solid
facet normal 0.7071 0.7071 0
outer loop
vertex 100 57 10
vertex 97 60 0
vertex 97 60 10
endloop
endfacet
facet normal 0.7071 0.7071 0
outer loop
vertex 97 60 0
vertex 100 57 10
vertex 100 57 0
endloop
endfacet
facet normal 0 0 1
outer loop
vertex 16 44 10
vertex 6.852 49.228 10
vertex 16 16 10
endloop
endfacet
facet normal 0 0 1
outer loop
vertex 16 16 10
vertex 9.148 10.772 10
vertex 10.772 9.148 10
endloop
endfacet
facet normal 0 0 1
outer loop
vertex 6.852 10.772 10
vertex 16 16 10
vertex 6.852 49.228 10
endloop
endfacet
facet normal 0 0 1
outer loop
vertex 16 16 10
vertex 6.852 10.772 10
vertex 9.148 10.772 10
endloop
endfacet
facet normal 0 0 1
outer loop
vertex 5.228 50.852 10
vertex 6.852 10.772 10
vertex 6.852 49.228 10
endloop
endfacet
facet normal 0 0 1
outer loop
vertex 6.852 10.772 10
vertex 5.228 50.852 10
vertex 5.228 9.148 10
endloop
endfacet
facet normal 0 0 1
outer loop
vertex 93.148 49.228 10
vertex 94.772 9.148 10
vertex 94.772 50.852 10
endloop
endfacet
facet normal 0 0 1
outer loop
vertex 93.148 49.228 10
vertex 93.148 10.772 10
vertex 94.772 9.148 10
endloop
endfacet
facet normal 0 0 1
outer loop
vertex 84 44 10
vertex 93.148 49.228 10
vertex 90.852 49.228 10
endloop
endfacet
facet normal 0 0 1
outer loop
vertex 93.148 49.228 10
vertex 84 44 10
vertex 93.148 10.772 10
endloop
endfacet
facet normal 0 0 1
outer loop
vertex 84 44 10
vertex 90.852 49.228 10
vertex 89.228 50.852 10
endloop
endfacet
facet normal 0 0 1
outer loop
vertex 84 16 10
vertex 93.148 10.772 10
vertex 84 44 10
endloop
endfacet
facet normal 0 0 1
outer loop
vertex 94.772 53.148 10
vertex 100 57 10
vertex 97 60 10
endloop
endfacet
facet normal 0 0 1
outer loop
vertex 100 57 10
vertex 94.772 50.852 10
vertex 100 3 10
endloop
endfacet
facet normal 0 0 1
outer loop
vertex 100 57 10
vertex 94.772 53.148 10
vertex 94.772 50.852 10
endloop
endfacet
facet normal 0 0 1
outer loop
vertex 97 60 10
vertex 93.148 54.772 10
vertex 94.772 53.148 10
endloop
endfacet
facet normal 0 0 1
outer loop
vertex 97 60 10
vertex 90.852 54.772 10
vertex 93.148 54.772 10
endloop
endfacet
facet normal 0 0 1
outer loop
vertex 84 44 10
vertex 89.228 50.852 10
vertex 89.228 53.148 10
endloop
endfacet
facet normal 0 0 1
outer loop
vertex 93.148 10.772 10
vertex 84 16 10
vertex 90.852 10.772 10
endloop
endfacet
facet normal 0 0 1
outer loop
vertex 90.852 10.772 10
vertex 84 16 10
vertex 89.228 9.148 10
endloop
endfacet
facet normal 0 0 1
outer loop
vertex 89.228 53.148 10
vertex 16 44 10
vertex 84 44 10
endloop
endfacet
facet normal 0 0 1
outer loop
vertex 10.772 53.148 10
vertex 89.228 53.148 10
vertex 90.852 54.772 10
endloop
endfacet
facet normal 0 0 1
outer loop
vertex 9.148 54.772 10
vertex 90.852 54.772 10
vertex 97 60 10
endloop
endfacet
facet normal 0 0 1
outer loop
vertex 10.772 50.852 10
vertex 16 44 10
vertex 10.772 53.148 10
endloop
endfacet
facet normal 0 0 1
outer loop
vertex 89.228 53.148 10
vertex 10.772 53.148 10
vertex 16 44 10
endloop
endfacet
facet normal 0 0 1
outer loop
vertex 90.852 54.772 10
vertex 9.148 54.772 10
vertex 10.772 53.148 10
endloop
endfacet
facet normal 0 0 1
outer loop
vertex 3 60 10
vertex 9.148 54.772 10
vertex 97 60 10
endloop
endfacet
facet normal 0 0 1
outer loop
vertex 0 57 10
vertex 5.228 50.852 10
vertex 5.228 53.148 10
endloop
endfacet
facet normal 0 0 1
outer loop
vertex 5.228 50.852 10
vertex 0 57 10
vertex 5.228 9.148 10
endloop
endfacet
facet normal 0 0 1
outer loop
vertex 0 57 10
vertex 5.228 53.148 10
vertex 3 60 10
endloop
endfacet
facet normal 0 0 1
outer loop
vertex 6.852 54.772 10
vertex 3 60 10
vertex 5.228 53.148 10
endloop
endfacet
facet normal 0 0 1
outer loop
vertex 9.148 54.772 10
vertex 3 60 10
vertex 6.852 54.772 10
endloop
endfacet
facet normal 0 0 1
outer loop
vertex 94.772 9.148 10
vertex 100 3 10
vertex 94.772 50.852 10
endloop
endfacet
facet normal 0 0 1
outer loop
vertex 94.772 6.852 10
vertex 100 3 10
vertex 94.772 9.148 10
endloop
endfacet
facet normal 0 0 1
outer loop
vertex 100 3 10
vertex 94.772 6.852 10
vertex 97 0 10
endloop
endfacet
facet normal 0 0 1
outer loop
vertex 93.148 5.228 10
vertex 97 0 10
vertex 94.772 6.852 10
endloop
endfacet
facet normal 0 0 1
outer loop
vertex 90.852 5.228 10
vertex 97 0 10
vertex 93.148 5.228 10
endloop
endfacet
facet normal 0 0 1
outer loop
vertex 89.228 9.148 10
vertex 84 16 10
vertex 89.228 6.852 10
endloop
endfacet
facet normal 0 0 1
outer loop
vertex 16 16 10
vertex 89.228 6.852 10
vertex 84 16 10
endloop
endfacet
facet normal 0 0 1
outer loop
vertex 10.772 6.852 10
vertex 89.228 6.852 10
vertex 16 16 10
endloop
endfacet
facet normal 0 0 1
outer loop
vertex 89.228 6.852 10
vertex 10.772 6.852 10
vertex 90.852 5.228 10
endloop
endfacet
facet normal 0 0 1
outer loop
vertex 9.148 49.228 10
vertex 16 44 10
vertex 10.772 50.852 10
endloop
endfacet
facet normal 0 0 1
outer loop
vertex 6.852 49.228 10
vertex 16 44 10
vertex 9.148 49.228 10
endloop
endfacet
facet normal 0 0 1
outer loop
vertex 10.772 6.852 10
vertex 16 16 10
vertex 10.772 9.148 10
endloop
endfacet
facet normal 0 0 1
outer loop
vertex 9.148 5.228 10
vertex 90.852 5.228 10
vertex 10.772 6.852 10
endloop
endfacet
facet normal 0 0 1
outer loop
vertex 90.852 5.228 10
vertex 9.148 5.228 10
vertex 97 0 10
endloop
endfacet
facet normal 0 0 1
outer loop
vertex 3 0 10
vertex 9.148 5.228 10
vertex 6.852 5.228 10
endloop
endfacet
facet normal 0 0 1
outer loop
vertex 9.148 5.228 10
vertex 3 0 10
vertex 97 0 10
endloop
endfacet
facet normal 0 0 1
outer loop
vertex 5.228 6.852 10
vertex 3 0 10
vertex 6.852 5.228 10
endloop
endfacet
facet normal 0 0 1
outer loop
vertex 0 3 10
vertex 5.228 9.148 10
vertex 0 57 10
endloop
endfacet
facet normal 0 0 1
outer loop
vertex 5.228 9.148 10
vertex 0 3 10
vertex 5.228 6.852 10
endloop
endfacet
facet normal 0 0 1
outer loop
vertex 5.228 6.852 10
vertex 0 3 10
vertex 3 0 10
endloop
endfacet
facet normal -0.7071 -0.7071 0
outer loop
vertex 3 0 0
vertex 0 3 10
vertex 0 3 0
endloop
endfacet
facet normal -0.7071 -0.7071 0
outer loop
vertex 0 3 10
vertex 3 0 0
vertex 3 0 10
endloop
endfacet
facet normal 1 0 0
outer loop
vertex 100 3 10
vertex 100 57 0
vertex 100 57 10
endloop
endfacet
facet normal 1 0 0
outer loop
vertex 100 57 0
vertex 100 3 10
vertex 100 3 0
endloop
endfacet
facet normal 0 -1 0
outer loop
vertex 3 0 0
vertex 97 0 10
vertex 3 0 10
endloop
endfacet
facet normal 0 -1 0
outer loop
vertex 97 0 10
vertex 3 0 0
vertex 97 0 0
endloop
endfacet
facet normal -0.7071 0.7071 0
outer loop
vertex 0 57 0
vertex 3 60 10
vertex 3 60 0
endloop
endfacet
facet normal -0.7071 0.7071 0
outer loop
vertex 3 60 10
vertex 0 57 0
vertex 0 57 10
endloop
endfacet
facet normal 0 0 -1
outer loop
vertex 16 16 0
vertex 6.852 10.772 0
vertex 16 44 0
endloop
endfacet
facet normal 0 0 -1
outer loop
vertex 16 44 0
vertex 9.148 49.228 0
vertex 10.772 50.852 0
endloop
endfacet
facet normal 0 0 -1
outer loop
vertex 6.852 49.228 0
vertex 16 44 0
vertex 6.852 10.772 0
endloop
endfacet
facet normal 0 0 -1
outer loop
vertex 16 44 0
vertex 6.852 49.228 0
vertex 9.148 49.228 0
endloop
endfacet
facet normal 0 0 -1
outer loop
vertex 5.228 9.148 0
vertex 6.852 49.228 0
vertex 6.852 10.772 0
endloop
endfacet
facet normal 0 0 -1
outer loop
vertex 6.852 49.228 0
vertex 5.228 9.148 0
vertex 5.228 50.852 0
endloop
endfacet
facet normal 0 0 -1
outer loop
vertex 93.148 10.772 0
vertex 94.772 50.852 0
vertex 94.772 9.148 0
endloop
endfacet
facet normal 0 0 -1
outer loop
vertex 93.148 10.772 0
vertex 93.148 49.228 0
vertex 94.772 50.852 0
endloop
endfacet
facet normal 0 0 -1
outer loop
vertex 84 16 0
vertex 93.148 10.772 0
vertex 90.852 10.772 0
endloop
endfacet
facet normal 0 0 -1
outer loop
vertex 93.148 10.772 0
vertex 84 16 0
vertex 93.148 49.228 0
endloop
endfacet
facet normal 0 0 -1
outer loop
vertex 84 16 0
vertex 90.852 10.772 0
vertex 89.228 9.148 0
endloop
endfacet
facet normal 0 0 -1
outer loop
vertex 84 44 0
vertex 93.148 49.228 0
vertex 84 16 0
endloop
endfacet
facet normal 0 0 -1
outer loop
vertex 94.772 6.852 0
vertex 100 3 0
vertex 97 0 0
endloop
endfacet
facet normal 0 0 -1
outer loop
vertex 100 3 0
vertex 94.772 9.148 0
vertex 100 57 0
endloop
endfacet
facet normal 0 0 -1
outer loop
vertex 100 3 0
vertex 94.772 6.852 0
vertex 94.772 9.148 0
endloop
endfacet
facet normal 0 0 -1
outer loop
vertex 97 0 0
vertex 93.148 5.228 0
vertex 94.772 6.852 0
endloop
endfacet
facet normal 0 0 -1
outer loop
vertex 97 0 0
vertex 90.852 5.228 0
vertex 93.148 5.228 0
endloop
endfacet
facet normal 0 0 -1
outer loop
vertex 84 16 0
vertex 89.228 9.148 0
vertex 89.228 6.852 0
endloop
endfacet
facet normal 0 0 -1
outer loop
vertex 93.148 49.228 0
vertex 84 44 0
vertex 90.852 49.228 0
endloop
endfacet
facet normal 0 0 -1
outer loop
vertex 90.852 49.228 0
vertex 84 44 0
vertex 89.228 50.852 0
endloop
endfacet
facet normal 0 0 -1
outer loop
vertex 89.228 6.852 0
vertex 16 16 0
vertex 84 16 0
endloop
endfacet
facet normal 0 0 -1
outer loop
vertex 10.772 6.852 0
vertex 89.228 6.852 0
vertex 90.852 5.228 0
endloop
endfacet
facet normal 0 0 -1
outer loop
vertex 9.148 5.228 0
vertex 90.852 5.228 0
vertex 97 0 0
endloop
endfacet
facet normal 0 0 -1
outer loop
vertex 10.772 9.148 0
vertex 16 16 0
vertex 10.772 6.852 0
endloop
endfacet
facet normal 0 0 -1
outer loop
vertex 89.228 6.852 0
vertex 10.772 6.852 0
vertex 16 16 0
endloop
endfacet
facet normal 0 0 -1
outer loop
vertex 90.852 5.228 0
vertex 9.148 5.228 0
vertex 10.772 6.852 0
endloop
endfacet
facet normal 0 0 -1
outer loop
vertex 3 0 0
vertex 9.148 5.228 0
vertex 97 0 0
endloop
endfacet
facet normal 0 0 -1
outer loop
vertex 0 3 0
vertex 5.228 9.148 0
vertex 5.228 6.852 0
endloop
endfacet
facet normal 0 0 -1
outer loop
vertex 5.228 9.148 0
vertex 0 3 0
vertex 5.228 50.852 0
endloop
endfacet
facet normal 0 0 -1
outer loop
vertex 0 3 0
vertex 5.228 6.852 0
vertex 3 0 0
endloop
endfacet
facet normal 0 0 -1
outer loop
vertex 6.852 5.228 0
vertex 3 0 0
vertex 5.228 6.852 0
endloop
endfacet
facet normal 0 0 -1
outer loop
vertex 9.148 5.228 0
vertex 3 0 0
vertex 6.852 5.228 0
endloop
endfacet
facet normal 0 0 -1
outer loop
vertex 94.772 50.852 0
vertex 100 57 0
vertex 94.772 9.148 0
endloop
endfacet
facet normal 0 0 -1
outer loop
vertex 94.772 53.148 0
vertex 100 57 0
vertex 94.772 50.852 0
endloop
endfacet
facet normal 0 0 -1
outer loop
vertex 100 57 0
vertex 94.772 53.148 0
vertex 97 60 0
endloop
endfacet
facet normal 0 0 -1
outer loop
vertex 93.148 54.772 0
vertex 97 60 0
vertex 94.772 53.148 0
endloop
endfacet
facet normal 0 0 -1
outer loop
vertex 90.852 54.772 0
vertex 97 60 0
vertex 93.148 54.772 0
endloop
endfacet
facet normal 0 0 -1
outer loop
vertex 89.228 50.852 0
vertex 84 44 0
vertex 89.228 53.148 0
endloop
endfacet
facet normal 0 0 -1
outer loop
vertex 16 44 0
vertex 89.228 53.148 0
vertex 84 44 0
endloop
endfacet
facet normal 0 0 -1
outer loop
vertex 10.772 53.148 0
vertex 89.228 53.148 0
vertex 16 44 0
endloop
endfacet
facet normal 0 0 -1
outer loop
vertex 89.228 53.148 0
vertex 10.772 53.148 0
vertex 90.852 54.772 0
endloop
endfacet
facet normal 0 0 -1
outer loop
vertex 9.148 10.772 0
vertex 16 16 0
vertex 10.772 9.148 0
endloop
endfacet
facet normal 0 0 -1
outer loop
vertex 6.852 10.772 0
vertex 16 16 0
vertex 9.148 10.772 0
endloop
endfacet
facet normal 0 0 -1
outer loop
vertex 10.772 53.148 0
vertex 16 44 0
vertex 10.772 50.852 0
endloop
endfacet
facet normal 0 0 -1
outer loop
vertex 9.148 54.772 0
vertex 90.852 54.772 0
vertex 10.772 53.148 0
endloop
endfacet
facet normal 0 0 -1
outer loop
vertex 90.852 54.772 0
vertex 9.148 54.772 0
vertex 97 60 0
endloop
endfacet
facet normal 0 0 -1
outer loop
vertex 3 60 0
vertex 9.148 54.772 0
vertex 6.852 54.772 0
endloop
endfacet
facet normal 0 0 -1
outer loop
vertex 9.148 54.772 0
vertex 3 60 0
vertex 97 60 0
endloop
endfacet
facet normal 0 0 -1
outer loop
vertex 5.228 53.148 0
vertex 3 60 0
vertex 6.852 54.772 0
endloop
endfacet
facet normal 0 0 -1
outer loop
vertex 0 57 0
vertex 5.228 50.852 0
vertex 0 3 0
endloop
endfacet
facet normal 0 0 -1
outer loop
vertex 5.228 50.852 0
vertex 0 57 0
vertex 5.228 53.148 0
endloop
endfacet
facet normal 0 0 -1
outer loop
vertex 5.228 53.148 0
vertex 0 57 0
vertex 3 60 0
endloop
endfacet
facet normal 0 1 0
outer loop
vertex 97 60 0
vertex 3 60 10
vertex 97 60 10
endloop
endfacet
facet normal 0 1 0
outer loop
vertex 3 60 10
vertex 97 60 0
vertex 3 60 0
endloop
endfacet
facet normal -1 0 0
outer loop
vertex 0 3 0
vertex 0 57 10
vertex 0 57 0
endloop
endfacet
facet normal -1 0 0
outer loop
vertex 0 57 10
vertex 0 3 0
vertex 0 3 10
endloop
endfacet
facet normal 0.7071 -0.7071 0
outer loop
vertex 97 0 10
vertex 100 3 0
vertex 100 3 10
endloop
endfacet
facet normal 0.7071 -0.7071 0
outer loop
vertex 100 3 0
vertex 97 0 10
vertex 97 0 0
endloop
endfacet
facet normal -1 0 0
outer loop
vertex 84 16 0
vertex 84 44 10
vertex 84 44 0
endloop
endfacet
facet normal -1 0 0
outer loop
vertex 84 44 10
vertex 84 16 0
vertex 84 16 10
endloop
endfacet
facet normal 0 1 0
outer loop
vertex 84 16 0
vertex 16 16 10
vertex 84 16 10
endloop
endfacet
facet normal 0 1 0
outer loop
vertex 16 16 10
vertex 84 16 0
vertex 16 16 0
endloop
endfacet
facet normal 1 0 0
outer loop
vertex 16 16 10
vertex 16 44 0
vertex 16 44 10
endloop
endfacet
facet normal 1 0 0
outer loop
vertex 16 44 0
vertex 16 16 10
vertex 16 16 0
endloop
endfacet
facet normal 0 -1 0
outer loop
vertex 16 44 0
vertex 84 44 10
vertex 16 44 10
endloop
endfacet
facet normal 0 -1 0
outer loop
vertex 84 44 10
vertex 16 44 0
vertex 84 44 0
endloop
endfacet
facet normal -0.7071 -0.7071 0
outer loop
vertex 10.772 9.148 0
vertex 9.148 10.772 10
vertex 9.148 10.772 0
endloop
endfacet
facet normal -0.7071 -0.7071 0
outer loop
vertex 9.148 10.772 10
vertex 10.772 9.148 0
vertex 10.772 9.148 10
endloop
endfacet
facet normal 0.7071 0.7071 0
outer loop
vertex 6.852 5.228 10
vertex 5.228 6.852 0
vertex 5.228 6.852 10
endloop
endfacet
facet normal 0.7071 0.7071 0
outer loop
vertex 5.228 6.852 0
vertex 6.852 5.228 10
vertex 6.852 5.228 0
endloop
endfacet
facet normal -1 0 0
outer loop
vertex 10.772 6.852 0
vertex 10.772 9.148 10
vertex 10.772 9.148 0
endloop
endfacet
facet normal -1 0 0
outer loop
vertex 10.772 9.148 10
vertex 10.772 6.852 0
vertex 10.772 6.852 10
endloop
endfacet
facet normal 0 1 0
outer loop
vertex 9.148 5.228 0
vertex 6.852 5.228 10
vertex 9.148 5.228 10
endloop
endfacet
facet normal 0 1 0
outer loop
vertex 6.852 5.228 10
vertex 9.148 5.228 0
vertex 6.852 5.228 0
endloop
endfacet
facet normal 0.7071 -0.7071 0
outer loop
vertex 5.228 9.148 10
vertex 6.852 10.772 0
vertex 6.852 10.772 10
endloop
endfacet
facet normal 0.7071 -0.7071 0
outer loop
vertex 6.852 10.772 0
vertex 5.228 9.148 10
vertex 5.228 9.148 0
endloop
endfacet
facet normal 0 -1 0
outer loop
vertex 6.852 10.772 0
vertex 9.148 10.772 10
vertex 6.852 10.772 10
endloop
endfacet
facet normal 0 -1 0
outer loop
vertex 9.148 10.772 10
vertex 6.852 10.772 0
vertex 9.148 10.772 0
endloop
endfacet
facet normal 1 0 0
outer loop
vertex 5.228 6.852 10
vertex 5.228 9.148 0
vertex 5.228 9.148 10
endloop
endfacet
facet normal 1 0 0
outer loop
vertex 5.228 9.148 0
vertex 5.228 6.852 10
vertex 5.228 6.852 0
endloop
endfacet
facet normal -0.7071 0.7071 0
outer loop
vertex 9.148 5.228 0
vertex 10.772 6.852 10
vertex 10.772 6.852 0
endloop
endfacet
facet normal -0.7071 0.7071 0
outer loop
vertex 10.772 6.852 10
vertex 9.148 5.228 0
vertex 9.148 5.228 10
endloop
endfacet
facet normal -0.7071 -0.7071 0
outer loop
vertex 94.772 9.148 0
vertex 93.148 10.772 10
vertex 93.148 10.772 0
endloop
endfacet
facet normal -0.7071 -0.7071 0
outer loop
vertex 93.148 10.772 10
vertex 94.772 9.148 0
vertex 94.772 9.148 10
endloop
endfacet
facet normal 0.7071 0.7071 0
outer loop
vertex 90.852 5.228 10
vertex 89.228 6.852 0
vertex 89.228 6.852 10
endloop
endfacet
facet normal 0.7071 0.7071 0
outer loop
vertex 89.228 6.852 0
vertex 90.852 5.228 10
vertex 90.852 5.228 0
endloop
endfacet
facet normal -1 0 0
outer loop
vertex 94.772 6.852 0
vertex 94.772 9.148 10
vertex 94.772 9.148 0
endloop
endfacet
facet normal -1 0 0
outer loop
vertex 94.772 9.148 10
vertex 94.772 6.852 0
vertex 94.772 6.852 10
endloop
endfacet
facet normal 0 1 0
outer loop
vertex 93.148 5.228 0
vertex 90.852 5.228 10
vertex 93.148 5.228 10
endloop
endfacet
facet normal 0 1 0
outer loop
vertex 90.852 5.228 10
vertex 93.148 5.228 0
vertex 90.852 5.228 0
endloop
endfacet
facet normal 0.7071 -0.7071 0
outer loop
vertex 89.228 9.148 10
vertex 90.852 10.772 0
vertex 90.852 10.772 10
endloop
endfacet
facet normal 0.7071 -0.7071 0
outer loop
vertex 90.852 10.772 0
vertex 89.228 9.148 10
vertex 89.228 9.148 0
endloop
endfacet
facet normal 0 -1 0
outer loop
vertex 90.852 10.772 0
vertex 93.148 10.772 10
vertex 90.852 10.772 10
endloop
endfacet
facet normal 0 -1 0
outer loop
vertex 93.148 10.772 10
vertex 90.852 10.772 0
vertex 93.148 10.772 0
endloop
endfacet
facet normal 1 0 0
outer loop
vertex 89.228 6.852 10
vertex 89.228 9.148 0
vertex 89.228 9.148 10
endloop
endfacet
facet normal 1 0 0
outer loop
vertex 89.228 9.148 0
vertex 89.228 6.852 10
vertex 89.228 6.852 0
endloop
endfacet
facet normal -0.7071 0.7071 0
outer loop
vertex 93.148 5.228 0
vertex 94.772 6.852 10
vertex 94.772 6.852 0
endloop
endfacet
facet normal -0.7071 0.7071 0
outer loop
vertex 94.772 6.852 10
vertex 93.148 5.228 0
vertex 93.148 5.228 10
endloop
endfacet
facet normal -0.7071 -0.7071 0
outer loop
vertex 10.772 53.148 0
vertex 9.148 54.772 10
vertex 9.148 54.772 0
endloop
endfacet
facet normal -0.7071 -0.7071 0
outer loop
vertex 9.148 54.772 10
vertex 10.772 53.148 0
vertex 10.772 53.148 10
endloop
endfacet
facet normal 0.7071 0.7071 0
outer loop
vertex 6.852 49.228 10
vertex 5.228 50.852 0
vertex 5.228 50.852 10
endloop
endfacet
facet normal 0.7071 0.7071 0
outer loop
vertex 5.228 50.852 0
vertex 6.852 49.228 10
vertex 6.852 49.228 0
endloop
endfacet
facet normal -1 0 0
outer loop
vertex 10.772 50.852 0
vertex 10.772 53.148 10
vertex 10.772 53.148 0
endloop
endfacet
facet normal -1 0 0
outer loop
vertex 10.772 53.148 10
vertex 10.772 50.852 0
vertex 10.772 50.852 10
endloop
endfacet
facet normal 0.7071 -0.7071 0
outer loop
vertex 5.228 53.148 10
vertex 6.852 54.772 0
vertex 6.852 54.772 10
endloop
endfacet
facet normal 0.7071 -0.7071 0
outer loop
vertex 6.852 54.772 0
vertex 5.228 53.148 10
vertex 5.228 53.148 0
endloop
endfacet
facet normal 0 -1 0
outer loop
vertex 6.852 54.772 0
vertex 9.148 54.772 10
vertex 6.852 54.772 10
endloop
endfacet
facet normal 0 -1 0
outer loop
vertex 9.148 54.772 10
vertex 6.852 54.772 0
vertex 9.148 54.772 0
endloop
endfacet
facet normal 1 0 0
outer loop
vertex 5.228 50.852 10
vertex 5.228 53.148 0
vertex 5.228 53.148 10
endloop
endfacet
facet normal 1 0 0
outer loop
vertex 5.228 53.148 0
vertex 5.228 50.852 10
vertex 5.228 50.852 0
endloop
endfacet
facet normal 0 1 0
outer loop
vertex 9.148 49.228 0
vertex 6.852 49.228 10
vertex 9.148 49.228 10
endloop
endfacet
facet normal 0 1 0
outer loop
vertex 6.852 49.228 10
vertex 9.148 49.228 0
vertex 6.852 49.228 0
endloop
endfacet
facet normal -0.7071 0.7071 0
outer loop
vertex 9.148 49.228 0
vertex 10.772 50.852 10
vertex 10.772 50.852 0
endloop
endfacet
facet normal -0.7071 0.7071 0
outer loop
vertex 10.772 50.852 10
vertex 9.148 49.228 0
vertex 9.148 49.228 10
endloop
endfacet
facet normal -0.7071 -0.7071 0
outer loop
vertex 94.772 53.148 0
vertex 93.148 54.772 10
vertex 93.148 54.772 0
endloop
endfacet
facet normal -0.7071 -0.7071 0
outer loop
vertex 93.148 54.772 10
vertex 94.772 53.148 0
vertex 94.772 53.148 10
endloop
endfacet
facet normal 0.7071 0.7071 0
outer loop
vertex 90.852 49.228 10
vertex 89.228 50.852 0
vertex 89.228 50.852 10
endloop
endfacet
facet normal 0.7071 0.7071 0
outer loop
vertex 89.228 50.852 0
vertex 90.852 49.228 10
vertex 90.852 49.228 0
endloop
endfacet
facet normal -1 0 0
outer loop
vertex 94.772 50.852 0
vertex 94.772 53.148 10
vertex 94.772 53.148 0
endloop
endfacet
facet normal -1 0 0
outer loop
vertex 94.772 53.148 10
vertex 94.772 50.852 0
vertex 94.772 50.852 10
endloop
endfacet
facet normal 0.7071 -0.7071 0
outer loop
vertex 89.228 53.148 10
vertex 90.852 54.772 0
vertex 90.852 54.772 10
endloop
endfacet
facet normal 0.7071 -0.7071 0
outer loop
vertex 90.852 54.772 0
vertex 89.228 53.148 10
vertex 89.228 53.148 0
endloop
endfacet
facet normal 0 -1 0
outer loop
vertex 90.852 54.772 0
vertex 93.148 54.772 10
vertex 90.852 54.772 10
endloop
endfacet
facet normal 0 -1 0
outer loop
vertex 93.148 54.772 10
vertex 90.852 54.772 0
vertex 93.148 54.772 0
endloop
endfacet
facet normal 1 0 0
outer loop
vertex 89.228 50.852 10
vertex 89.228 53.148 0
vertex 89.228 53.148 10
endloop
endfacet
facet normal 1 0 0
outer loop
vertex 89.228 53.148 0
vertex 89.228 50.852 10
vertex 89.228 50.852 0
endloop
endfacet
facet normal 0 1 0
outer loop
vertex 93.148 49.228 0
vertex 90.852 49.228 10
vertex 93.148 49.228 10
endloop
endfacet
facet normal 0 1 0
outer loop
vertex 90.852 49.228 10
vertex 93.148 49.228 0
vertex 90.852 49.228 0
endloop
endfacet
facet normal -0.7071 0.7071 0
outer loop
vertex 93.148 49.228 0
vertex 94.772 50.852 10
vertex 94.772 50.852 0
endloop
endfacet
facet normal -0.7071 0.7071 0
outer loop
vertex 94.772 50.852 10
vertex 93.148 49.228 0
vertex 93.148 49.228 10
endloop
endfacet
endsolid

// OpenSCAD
$fn = 32;

// ----------------------------------------------------------------------
// Frame plate: 100 x 60 frame, 16 mm rails
// ----------------------------------------------------------------------

// --- parameters (mm) ---
plate_l = 100;            // plate length, X
plate_w = 60;             // plate width, Y
plate_t = 10;             // plate thickness, Z (extrusion height)
corner_c = 3;             // corner chamfer
frame_bar = 16;           // frame rail width
bolt_r = 3;               // corner bolt window radius
bolt_inset = 8;           // bolt centre inset from the edges

win_l = plate_l - 2 * frame_bar;  // window length
win_w = plate_w - 2 * frame_bar;  // window width
bolt_d = 2 * bolt_r;  // corner hole diameter

profile = [[3, 0], [97, 0], [100, 3], [100, 57], [97, 60], [3, 60], [0, 57], [0, 3]];  // primary outline, 8 points, counter clockwise
void_1 = [[16, 16], [84, 16], [84, 44], [16, 44]];  // the window, 4 points
void_2 = [[10.772, 9.148], [9.148, 10.772], [6.852, 10.772], [5.228, 9.148], [5.228, 6.852], [6.852, 5.228], [9.148, 5.228], [10.772, 6.852]];  // corner bolt window, 8 points
void_3 = [[94.772, 9.148], [93.148, 10.772], [90.852, 10.772], [89.228, 9.148], [89.228, 6.852], [90.852, 5.228], [93.148, 5.228], [94.772, 6.852]];  // corner bolt window, 8 points
void_4 = [[10.772, 53.148], [9.148, 54.772], [6.852, 54.772], [5.228, 53.148], [5.228, 50.852], [6.852, 49.228], [9.148, 49.228], [10.772, 50.852]];  // corner bolt window, 8 points
void_5 = [[94.772, 53.148], [93.148, 54.772], [90.852, 54.772], [89.228, 53.148], [89.228, 50.852], [90.852, 49.228], [93.148, 49.228], [94.772, 50.852]];  // corner bolt window, 8 points

// --- the one profile operation ---
difference() {
  linear_extrude(height = plate_t) polygon(points = profile);
  translate([0, 0, -1])
    linear_extrude(height = plate_t + 2) polygon(points = void_1);
  translate([0, 0, -1])
    linear_extrude(height = plate_t + 2) polygon(points = void_2);
  translate([0, 0, -1])
    linear_extrude(height = plate_t + 2) polygon(points = void_3);
  translate([0, 0, -1])
    linear_extrude(height = plate_t + 2) polygon(points = void_4);
  translate([0, 0, -1])
    linear_extrude(height = plate_t + 2) polygon(points = void_5);
}
